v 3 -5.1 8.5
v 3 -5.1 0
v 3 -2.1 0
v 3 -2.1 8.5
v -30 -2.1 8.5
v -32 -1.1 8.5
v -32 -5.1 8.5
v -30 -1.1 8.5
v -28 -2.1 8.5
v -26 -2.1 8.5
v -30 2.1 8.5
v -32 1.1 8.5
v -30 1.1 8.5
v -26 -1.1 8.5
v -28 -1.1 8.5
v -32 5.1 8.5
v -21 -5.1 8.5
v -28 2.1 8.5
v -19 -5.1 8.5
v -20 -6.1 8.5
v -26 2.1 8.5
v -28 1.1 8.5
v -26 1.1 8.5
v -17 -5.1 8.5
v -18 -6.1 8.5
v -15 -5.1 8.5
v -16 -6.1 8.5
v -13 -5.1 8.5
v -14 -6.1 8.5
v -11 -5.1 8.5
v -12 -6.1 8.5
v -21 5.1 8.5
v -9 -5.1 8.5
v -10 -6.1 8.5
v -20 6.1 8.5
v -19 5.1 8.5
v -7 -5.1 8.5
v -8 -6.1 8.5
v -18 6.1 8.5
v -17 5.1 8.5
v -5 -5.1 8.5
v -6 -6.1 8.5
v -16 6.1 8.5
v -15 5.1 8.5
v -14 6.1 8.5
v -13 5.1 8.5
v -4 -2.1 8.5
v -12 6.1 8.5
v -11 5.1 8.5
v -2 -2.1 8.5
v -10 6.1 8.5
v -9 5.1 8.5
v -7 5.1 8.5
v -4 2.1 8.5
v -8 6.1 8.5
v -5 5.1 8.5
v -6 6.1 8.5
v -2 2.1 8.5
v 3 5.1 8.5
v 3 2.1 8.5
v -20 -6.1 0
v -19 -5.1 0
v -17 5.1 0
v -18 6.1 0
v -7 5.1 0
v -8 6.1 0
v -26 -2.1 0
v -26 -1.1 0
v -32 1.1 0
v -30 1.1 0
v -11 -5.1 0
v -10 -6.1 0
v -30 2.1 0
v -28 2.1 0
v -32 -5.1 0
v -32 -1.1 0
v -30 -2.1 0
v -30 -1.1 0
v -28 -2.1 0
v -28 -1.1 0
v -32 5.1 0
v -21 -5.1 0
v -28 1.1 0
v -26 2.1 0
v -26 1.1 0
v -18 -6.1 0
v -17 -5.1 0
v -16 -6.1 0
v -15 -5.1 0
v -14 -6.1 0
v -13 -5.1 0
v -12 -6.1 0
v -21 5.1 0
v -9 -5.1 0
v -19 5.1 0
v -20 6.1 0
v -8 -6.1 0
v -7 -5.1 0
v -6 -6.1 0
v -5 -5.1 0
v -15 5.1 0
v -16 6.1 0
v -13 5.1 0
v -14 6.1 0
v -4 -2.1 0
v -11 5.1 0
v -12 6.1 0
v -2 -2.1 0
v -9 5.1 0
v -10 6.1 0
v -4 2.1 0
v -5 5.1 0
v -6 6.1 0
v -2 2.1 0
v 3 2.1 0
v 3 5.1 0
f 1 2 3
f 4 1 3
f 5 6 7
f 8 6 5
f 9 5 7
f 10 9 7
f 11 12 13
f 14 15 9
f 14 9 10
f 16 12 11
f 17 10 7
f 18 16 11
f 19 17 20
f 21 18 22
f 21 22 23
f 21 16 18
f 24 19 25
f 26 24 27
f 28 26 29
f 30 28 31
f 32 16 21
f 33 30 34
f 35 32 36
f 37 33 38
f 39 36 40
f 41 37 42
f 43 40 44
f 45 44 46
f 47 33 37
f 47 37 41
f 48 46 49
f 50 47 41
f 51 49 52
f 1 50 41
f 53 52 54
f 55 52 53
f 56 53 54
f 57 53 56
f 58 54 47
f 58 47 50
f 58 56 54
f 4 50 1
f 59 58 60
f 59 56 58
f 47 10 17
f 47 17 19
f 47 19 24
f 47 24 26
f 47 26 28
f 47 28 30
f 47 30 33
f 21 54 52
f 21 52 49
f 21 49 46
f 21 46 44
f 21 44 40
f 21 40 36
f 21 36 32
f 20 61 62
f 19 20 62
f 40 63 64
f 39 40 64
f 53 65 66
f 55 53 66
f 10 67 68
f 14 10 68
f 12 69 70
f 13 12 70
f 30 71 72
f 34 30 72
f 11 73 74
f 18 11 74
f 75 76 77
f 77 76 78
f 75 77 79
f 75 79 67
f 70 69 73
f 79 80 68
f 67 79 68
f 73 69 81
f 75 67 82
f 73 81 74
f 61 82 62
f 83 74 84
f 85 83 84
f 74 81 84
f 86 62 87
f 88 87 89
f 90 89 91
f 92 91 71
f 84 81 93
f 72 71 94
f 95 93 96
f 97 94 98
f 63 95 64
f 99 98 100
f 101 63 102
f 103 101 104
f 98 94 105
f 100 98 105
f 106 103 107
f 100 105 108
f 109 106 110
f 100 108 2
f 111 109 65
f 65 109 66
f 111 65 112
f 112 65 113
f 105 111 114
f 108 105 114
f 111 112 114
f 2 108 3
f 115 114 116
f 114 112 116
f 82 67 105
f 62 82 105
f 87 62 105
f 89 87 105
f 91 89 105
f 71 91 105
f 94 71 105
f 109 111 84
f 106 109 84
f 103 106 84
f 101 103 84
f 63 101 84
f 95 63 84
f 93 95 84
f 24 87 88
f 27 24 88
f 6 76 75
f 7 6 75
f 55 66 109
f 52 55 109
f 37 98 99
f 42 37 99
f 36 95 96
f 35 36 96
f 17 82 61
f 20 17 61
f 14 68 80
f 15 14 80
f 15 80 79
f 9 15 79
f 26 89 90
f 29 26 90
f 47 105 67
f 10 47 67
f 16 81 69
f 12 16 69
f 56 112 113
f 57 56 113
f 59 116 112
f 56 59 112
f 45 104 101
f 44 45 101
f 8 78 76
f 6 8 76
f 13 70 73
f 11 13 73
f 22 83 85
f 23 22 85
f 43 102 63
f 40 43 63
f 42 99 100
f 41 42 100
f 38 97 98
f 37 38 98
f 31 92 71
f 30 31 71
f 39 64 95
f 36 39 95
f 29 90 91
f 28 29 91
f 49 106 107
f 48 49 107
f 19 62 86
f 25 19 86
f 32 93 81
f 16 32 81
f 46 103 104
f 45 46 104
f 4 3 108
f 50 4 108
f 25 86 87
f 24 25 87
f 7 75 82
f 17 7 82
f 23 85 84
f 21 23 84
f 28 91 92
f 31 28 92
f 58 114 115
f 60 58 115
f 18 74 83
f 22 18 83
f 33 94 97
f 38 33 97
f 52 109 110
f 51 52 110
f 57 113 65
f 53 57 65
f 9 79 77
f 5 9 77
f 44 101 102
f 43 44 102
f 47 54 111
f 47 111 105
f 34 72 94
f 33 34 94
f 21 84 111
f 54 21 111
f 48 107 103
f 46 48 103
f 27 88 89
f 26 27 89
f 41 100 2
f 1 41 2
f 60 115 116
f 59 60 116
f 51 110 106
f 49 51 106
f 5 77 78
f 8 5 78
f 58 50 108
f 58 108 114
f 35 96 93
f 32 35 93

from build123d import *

# Parameters (mm, degrees)
F1_DEPTH = 8.5


with BuildPart() as f1:
    # F0 (on Top) → F1 (new body)
    with BuildSketch(Plane.XY):
        Polygon((-4, 2.1), (-4, 0), (-2, 0), (-2, 2.1), (3, 2.1), (3, 5.1), (-5, 5.1), (-7, 5.1), (-9, 5.1), (-11, 5.1), (-13, 5.1), (-15, 5.1), (-17, 5.1), (-19, 5.1), (-21, 5.1), (-32, 5.1), (-32, 2.1), (-32, 1.1), (-30, 1.1), (-30, 2.1), (-28, 2.1), (-28, 1.1), (-26, 1.1), (-26, 2.1), align=None)
        Polygon((-2, 0), (-4, 0), (-4, -2.1), (-26, -2.1), (-26, -1.1), (-28, -1.1), (-28, -2.1), (-30, -2.1), (-30, -1.1), (-32, -1.1), (-32, -2.1), (-32, -5.1), (-21, -5.1), (-19, -5.1), (-17, -5.1), (-15, -5.1), (-13, -5.1), (-11, -5.1), (-9, -5.1), (-7, -5.1), (-5, -5.1), (3, -5.1), (3, -2.1), (-2, -2.1), align=None)
        Polygon((-7, 5.1), (-5, 5.1), (-6, 6.1), align=None)
        Polygon((-6, -6.1), (-5, -5.1), (-7, -5.1), align=None)
        Polygon((-9, 5.1), (-7, 5.1), (-8, 6.1), align=None)
        Polygon((-8, -6.1), (-7, -5.1), (-9, -5.1), align=None)
        Polygon((-11, 5.1), (-9, 5.1), (-10, 6.1), align=None)
        Polygon((-10, -6.1), (-9, -5.1), (-11, -5.1), align=None)
        Polygon((-13, 5.1), (-11, 5.1), (-12, 6.1), align=None)
        Polygon((-12, -6.1), (-11, -5.1), (-13, -5.1), align=None)
        Polygon((-15, 5.1), (-13, 5.1), (-14, 6.1), align=None)
        Polygon((-14, -6.1), (-13, -5.1), (-15, -5.1), align=None)
        Polygon((-17, 5.1), (-15, 5.1), (-16, 6.1), align=None)
        Polygon((-16, -6.1), (-15, -5.1), (-17, -5.1), align=None)
        Polygon((-19, 5.1), (-17, 5.1), (-18, 6.1), align=None)
        Polygon((-18, -6.1), (-17, -5.1), (-19, -5.1), align=None)
        Polygon((-20, 6.1), (-21, 5.1), (-19, 5.1), align=None)
        Polygon((-19, -5.1), (-21, -5.1), (-20, -6.1), align=None)
    extrude(amount=F1_DEPTH)


solid = f1.part
